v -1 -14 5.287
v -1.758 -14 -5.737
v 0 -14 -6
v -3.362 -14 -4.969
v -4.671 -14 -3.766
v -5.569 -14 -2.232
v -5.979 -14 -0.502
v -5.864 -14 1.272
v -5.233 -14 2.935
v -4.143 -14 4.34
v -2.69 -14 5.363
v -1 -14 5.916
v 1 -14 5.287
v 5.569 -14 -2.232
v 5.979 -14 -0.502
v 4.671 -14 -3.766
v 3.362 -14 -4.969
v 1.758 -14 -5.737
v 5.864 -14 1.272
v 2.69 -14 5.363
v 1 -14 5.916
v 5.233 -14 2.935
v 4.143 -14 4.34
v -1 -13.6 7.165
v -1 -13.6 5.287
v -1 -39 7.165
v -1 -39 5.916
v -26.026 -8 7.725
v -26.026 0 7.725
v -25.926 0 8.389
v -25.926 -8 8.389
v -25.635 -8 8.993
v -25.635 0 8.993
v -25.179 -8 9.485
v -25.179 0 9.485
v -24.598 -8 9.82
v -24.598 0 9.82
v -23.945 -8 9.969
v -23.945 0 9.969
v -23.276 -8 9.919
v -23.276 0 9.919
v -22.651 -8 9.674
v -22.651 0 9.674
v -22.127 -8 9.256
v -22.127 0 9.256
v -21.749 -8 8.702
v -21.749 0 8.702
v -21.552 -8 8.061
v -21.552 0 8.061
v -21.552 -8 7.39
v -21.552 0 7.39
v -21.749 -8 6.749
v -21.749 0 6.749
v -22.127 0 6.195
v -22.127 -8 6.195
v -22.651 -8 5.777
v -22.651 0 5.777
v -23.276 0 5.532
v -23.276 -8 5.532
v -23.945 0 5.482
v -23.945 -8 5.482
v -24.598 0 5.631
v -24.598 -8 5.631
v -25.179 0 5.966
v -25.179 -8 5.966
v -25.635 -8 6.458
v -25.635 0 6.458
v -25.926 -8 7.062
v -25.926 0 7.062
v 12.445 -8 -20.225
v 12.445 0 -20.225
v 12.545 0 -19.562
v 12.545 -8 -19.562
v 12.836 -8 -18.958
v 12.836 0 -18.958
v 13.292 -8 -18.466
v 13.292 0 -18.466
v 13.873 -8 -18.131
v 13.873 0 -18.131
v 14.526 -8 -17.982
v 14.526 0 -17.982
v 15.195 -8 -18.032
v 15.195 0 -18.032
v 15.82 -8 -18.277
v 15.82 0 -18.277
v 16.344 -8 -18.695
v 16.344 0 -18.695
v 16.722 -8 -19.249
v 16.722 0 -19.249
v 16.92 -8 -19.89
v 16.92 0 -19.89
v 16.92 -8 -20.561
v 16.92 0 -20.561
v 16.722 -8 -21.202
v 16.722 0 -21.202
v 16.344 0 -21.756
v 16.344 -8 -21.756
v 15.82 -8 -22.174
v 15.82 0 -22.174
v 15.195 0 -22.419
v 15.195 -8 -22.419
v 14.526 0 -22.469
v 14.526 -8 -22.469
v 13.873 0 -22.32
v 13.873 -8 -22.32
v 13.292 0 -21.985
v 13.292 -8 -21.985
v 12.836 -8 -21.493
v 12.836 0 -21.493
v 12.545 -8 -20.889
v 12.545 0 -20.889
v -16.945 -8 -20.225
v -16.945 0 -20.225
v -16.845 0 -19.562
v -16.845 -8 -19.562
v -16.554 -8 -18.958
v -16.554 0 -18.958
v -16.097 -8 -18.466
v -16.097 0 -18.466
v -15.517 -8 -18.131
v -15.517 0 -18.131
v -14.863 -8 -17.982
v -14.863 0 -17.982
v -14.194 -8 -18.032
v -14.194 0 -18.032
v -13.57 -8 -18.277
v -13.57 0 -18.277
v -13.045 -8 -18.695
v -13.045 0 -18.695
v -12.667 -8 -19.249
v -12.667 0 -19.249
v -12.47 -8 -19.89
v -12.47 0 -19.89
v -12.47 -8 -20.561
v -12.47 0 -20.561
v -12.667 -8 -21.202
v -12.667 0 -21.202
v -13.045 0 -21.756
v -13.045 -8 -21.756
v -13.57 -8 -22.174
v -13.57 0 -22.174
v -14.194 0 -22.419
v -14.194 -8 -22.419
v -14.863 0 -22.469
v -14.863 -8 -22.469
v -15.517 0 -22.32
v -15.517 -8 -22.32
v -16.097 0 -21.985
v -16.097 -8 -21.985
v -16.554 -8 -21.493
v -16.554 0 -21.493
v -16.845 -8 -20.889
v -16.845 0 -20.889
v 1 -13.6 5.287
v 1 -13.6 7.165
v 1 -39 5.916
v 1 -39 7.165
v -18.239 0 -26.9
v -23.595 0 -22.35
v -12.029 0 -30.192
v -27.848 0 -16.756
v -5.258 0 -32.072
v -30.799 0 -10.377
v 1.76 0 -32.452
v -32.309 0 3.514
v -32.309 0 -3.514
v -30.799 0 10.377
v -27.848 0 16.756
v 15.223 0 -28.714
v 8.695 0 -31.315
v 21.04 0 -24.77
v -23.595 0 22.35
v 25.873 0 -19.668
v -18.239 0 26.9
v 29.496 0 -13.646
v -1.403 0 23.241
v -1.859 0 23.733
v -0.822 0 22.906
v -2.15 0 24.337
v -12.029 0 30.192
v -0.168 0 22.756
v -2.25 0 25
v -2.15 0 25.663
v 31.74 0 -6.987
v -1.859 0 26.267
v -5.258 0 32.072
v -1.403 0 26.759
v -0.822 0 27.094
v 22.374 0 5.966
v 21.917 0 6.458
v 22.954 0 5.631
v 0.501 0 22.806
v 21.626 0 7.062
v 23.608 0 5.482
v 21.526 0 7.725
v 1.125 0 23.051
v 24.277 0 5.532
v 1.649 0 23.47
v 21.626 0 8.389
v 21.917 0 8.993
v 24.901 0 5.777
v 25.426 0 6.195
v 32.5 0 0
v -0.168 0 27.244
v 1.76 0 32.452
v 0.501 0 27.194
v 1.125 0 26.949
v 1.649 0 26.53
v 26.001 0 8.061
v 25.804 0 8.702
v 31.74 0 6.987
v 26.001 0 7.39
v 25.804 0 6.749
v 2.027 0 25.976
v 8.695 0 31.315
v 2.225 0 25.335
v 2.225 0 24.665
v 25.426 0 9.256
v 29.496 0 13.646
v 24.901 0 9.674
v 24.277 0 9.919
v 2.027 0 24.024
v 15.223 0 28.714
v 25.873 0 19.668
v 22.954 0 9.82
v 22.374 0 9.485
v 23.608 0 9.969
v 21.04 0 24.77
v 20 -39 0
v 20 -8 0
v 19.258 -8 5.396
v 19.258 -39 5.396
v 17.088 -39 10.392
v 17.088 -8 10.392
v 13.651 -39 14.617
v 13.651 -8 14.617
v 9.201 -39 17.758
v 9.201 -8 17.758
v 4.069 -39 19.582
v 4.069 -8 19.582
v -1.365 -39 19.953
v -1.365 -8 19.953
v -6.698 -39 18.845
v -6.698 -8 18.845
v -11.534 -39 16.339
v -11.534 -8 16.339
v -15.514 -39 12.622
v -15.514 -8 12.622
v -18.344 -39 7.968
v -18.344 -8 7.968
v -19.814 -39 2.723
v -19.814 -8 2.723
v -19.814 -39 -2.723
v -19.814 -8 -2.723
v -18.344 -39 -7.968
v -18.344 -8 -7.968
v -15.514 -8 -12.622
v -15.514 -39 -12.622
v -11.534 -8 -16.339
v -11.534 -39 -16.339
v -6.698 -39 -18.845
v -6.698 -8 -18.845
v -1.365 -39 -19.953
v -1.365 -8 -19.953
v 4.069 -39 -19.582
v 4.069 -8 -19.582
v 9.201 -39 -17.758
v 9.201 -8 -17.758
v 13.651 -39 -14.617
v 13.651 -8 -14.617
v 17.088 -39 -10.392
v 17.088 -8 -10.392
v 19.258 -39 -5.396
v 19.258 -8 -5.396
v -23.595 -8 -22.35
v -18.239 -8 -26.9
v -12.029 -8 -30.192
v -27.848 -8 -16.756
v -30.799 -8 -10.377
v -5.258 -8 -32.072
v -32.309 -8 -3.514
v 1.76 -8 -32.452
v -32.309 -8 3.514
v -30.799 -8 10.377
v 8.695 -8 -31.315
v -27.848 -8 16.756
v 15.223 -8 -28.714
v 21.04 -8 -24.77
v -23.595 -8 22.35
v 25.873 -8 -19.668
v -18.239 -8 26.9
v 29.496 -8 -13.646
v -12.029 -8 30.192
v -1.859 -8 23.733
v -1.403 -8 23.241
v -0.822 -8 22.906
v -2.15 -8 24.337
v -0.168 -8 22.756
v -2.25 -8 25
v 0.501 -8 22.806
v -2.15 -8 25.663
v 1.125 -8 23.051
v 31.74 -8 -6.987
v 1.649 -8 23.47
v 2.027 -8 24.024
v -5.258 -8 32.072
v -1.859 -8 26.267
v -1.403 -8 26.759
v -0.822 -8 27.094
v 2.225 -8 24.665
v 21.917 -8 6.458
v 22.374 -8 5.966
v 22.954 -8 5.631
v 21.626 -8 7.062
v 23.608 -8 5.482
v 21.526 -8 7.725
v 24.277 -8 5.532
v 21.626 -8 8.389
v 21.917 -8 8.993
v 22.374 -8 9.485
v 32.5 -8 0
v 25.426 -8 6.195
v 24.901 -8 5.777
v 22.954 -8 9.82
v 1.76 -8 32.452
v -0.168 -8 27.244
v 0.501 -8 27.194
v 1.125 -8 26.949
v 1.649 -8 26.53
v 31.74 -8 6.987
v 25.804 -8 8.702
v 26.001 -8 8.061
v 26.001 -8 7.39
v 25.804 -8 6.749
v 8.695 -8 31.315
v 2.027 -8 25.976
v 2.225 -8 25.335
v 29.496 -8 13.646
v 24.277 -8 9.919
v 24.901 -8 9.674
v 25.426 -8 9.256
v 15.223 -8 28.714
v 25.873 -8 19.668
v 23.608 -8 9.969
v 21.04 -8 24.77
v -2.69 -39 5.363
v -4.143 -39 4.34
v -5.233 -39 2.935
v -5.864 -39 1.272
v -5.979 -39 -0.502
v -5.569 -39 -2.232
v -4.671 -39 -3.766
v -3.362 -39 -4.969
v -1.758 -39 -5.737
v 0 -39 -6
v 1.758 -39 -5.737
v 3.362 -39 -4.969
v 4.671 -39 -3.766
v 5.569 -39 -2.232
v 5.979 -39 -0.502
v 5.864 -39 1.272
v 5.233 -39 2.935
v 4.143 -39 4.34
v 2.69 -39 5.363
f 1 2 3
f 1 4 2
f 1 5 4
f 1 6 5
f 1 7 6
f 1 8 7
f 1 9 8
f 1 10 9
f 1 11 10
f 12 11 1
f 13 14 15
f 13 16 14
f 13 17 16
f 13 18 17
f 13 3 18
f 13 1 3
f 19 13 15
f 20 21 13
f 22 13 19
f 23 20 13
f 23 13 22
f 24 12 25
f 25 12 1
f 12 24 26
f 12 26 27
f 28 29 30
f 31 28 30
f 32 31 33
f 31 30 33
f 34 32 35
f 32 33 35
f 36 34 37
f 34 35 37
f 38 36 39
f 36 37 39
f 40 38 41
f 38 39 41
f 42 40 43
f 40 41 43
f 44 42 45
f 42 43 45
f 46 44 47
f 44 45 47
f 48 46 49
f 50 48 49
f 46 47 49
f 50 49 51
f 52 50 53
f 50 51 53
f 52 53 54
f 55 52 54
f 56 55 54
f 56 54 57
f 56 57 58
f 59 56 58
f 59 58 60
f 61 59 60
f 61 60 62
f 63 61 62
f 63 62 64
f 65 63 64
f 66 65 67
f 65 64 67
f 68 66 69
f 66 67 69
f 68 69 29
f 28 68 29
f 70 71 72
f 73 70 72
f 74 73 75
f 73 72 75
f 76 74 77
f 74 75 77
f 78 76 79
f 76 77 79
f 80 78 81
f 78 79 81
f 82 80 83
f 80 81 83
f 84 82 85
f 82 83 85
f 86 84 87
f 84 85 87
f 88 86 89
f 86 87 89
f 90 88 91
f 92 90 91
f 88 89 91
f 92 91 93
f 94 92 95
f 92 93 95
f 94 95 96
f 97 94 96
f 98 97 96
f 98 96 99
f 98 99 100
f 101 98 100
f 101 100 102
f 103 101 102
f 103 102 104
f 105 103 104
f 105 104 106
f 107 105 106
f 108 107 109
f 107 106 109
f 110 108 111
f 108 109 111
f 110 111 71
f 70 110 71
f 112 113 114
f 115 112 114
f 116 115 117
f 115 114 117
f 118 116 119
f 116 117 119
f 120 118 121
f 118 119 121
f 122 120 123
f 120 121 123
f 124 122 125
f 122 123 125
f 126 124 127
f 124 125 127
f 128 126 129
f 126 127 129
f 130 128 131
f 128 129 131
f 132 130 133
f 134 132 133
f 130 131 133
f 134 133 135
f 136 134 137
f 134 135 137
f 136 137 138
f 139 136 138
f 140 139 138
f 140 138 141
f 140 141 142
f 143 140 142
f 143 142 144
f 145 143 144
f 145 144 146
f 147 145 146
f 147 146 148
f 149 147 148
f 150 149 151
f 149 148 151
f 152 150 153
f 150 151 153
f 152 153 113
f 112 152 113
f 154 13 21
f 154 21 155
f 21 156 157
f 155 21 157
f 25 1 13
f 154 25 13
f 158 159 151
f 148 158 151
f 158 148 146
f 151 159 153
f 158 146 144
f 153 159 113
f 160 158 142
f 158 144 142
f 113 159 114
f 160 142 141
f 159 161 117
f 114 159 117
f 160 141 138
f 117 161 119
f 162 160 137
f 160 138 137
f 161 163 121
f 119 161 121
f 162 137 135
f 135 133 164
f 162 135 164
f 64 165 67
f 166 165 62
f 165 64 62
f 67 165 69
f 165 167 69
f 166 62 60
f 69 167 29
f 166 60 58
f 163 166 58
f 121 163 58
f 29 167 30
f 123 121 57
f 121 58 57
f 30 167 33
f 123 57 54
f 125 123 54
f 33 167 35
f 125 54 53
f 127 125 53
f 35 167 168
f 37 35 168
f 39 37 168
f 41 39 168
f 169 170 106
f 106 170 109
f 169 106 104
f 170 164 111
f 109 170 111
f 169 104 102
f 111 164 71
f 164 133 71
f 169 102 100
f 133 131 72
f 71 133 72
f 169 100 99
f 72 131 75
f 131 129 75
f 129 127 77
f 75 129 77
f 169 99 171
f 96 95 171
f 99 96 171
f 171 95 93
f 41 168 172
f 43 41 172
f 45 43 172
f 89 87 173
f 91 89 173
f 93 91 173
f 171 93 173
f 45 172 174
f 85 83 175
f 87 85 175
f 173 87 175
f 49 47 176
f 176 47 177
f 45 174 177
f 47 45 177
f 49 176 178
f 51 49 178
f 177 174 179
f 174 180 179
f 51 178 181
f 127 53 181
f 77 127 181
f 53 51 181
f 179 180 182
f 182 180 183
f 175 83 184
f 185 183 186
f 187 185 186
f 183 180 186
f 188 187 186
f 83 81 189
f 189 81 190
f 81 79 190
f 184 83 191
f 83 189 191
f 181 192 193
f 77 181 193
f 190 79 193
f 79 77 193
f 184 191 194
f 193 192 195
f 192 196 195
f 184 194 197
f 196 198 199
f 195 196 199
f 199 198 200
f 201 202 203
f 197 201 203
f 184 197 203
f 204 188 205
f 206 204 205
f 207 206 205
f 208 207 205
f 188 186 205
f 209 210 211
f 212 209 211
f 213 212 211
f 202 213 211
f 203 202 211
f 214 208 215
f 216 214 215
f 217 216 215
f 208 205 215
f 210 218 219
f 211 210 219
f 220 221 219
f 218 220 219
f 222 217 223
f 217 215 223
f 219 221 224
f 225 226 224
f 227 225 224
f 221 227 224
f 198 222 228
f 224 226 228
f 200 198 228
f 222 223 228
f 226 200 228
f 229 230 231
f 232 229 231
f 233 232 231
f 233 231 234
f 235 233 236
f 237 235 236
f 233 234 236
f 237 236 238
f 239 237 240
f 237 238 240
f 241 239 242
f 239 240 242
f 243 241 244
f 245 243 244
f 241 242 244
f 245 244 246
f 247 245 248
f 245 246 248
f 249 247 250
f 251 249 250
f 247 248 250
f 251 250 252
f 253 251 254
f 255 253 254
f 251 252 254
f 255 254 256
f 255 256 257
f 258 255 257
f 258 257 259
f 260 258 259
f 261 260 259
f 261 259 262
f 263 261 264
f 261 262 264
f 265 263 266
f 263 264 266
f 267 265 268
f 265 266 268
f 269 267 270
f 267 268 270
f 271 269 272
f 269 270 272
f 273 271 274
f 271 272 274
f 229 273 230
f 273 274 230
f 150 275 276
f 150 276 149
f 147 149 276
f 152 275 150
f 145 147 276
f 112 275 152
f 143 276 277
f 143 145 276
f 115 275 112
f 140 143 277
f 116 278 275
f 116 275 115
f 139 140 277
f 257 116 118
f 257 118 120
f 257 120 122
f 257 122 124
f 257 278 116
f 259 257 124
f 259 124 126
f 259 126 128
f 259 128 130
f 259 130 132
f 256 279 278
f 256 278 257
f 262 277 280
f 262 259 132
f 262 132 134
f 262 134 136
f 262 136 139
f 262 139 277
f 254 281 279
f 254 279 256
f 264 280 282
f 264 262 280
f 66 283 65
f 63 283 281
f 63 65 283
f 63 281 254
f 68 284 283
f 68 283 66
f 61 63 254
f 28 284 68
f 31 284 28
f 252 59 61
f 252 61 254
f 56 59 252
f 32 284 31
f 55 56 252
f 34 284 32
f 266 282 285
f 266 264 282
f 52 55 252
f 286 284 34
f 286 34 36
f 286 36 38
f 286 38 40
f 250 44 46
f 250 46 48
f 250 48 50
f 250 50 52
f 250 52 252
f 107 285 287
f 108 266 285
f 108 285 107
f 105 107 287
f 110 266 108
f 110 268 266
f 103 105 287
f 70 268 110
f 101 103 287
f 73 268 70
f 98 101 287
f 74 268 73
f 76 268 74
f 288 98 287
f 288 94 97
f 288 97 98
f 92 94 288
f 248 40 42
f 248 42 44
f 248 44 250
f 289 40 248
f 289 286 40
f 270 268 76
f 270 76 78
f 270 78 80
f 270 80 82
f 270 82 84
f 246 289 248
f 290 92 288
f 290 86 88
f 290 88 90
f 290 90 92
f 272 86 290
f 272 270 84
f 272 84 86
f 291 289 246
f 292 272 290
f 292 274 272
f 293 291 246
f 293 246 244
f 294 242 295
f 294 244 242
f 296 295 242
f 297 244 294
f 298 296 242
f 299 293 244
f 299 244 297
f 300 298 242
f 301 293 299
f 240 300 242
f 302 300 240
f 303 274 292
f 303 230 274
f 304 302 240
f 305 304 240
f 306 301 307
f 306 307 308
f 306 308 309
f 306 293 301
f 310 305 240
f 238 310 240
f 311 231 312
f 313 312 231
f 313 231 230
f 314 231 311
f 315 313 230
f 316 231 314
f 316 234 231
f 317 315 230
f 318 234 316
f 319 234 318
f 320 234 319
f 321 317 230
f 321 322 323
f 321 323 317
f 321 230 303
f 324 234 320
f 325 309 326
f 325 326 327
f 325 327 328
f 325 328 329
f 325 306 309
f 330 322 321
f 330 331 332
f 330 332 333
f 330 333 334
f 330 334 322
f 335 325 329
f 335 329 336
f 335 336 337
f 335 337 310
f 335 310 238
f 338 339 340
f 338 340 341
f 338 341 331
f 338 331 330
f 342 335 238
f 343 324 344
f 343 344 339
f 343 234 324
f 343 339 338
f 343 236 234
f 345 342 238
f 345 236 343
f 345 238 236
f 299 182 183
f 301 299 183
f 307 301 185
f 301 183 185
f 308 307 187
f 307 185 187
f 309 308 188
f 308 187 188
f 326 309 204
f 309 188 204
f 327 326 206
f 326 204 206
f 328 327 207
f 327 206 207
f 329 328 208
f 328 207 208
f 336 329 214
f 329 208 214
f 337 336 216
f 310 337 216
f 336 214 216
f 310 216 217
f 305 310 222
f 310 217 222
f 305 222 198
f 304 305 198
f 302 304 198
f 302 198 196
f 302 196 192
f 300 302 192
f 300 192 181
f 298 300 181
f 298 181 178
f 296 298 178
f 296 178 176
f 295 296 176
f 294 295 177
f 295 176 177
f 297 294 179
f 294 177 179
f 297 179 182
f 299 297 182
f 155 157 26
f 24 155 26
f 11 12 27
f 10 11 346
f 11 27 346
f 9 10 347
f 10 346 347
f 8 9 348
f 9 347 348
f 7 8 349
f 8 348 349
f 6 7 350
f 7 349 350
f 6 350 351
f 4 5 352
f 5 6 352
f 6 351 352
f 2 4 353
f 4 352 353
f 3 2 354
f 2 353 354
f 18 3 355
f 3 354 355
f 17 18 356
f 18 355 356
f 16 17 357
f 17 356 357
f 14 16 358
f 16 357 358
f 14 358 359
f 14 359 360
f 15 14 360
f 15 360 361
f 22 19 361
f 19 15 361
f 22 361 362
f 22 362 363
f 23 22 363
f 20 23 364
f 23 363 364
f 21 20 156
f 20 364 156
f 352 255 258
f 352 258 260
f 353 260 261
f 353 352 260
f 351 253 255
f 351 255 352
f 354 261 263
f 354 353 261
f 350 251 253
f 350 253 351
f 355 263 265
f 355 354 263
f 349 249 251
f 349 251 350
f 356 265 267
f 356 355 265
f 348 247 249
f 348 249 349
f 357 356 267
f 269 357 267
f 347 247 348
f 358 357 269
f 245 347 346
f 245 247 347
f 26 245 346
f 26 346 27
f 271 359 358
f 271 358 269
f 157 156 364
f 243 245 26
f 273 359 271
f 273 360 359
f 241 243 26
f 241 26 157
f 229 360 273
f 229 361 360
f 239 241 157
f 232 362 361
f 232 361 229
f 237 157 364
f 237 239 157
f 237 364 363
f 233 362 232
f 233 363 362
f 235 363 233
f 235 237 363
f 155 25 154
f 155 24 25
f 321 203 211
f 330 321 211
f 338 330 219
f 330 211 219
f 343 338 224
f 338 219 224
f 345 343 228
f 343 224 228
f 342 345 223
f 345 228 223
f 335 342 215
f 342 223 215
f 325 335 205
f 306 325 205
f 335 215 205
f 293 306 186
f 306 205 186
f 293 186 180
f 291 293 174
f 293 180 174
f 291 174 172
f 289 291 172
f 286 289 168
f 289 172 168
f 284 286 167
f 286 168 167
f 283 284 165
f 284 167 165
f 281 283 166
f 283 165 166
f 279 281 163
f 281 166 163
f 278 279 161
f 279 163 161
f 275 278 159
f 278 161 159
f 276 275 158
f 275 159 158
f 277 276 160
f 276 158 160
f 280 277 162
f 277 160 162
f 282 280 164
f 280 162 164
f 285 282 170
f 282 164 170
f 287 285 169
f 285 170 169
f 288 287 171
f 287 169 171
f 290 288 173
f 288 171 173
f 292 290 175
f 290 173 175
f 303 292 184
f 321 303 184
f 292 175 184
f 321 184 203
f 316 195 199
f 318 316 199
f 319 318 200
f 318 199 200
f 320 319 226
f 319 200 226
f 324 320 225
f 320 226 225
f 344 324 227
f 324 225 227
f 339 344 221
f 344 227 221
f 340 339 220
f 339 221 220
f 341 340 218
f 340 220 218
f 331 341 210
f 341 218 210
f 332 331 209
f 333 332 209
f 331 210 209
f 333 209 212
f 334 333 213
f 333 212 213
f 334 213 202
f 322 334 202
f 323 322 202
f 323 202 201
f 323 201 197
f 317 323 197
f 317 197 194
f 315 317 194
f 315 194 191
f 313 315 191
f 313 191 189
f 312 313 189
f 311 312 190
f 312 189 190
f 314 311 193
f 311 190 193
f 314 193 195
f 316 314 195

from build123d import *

# Parameters (mm, degrees)
F0_R     = 32.5
F1_DEPTH = 8
F2_R     = 20
F3_DEPTH = 31
F4_R     = 6
F5_DEPTH = 25
F7_DEPTH = 25.4
F8_R     = 2.25
F9_DEPTH = 8


with BuildPart() as f1:
    # F0 (on Front) → F1 (new body)
    with BuildSketch(Plane.XZ):
        Circle(F0_R)
    extrude(amount=F1_DEPTH)

    # F2 (on face) → F3 (join)
    with BuildSketch(Plane.XZ.offset(8)):
        Circle(F2_R)
    extrude(amount=F3_DEPTH)

    # F4 (on face) → F5 (cut)
    with BuildSketch(Plane.XZ.offset(39)):
        Circle(F4_R)
    extrude(amount=-F5_DEPTH, mode=Mode.SUBTRACT)

    # F6 (on face) → F7 (cut)
    with BuildSketch(Plane.XZ.offset(39)):
        Polygon((-1, 5.287178), (0, 5.287178), (1, 5.287178), (1, 7.165323), (-1, 7.165323), align=None)
    extrude(amount=-F7_DEPTH, mode=Mode.SUBTRACT)

    # F8 (on face) → F9 (cut, through all)
    with BuildSketch(Plane(origin=(0, 0, 0), x_dir=(-1, 0, 0), z_dir=(0, 1, 0))):
        with Locations((0, 25)):
            Circle(F8_R)
        with Locations((-23.776413, 7.725425)):
            Circle(F8_R)
        with Locations((-14.694631, -20.225425)):
            Circle(F8_R)
        with Locations((14.694631, -20.225425)):
            Circle(F8_R)
        with Locations((23.776413, 7.725425)):
            Circle(F8_R)
    extrude(amount=-F9_DEPTH, mode=Mode.SUBTRACT)


solid = f1.part
